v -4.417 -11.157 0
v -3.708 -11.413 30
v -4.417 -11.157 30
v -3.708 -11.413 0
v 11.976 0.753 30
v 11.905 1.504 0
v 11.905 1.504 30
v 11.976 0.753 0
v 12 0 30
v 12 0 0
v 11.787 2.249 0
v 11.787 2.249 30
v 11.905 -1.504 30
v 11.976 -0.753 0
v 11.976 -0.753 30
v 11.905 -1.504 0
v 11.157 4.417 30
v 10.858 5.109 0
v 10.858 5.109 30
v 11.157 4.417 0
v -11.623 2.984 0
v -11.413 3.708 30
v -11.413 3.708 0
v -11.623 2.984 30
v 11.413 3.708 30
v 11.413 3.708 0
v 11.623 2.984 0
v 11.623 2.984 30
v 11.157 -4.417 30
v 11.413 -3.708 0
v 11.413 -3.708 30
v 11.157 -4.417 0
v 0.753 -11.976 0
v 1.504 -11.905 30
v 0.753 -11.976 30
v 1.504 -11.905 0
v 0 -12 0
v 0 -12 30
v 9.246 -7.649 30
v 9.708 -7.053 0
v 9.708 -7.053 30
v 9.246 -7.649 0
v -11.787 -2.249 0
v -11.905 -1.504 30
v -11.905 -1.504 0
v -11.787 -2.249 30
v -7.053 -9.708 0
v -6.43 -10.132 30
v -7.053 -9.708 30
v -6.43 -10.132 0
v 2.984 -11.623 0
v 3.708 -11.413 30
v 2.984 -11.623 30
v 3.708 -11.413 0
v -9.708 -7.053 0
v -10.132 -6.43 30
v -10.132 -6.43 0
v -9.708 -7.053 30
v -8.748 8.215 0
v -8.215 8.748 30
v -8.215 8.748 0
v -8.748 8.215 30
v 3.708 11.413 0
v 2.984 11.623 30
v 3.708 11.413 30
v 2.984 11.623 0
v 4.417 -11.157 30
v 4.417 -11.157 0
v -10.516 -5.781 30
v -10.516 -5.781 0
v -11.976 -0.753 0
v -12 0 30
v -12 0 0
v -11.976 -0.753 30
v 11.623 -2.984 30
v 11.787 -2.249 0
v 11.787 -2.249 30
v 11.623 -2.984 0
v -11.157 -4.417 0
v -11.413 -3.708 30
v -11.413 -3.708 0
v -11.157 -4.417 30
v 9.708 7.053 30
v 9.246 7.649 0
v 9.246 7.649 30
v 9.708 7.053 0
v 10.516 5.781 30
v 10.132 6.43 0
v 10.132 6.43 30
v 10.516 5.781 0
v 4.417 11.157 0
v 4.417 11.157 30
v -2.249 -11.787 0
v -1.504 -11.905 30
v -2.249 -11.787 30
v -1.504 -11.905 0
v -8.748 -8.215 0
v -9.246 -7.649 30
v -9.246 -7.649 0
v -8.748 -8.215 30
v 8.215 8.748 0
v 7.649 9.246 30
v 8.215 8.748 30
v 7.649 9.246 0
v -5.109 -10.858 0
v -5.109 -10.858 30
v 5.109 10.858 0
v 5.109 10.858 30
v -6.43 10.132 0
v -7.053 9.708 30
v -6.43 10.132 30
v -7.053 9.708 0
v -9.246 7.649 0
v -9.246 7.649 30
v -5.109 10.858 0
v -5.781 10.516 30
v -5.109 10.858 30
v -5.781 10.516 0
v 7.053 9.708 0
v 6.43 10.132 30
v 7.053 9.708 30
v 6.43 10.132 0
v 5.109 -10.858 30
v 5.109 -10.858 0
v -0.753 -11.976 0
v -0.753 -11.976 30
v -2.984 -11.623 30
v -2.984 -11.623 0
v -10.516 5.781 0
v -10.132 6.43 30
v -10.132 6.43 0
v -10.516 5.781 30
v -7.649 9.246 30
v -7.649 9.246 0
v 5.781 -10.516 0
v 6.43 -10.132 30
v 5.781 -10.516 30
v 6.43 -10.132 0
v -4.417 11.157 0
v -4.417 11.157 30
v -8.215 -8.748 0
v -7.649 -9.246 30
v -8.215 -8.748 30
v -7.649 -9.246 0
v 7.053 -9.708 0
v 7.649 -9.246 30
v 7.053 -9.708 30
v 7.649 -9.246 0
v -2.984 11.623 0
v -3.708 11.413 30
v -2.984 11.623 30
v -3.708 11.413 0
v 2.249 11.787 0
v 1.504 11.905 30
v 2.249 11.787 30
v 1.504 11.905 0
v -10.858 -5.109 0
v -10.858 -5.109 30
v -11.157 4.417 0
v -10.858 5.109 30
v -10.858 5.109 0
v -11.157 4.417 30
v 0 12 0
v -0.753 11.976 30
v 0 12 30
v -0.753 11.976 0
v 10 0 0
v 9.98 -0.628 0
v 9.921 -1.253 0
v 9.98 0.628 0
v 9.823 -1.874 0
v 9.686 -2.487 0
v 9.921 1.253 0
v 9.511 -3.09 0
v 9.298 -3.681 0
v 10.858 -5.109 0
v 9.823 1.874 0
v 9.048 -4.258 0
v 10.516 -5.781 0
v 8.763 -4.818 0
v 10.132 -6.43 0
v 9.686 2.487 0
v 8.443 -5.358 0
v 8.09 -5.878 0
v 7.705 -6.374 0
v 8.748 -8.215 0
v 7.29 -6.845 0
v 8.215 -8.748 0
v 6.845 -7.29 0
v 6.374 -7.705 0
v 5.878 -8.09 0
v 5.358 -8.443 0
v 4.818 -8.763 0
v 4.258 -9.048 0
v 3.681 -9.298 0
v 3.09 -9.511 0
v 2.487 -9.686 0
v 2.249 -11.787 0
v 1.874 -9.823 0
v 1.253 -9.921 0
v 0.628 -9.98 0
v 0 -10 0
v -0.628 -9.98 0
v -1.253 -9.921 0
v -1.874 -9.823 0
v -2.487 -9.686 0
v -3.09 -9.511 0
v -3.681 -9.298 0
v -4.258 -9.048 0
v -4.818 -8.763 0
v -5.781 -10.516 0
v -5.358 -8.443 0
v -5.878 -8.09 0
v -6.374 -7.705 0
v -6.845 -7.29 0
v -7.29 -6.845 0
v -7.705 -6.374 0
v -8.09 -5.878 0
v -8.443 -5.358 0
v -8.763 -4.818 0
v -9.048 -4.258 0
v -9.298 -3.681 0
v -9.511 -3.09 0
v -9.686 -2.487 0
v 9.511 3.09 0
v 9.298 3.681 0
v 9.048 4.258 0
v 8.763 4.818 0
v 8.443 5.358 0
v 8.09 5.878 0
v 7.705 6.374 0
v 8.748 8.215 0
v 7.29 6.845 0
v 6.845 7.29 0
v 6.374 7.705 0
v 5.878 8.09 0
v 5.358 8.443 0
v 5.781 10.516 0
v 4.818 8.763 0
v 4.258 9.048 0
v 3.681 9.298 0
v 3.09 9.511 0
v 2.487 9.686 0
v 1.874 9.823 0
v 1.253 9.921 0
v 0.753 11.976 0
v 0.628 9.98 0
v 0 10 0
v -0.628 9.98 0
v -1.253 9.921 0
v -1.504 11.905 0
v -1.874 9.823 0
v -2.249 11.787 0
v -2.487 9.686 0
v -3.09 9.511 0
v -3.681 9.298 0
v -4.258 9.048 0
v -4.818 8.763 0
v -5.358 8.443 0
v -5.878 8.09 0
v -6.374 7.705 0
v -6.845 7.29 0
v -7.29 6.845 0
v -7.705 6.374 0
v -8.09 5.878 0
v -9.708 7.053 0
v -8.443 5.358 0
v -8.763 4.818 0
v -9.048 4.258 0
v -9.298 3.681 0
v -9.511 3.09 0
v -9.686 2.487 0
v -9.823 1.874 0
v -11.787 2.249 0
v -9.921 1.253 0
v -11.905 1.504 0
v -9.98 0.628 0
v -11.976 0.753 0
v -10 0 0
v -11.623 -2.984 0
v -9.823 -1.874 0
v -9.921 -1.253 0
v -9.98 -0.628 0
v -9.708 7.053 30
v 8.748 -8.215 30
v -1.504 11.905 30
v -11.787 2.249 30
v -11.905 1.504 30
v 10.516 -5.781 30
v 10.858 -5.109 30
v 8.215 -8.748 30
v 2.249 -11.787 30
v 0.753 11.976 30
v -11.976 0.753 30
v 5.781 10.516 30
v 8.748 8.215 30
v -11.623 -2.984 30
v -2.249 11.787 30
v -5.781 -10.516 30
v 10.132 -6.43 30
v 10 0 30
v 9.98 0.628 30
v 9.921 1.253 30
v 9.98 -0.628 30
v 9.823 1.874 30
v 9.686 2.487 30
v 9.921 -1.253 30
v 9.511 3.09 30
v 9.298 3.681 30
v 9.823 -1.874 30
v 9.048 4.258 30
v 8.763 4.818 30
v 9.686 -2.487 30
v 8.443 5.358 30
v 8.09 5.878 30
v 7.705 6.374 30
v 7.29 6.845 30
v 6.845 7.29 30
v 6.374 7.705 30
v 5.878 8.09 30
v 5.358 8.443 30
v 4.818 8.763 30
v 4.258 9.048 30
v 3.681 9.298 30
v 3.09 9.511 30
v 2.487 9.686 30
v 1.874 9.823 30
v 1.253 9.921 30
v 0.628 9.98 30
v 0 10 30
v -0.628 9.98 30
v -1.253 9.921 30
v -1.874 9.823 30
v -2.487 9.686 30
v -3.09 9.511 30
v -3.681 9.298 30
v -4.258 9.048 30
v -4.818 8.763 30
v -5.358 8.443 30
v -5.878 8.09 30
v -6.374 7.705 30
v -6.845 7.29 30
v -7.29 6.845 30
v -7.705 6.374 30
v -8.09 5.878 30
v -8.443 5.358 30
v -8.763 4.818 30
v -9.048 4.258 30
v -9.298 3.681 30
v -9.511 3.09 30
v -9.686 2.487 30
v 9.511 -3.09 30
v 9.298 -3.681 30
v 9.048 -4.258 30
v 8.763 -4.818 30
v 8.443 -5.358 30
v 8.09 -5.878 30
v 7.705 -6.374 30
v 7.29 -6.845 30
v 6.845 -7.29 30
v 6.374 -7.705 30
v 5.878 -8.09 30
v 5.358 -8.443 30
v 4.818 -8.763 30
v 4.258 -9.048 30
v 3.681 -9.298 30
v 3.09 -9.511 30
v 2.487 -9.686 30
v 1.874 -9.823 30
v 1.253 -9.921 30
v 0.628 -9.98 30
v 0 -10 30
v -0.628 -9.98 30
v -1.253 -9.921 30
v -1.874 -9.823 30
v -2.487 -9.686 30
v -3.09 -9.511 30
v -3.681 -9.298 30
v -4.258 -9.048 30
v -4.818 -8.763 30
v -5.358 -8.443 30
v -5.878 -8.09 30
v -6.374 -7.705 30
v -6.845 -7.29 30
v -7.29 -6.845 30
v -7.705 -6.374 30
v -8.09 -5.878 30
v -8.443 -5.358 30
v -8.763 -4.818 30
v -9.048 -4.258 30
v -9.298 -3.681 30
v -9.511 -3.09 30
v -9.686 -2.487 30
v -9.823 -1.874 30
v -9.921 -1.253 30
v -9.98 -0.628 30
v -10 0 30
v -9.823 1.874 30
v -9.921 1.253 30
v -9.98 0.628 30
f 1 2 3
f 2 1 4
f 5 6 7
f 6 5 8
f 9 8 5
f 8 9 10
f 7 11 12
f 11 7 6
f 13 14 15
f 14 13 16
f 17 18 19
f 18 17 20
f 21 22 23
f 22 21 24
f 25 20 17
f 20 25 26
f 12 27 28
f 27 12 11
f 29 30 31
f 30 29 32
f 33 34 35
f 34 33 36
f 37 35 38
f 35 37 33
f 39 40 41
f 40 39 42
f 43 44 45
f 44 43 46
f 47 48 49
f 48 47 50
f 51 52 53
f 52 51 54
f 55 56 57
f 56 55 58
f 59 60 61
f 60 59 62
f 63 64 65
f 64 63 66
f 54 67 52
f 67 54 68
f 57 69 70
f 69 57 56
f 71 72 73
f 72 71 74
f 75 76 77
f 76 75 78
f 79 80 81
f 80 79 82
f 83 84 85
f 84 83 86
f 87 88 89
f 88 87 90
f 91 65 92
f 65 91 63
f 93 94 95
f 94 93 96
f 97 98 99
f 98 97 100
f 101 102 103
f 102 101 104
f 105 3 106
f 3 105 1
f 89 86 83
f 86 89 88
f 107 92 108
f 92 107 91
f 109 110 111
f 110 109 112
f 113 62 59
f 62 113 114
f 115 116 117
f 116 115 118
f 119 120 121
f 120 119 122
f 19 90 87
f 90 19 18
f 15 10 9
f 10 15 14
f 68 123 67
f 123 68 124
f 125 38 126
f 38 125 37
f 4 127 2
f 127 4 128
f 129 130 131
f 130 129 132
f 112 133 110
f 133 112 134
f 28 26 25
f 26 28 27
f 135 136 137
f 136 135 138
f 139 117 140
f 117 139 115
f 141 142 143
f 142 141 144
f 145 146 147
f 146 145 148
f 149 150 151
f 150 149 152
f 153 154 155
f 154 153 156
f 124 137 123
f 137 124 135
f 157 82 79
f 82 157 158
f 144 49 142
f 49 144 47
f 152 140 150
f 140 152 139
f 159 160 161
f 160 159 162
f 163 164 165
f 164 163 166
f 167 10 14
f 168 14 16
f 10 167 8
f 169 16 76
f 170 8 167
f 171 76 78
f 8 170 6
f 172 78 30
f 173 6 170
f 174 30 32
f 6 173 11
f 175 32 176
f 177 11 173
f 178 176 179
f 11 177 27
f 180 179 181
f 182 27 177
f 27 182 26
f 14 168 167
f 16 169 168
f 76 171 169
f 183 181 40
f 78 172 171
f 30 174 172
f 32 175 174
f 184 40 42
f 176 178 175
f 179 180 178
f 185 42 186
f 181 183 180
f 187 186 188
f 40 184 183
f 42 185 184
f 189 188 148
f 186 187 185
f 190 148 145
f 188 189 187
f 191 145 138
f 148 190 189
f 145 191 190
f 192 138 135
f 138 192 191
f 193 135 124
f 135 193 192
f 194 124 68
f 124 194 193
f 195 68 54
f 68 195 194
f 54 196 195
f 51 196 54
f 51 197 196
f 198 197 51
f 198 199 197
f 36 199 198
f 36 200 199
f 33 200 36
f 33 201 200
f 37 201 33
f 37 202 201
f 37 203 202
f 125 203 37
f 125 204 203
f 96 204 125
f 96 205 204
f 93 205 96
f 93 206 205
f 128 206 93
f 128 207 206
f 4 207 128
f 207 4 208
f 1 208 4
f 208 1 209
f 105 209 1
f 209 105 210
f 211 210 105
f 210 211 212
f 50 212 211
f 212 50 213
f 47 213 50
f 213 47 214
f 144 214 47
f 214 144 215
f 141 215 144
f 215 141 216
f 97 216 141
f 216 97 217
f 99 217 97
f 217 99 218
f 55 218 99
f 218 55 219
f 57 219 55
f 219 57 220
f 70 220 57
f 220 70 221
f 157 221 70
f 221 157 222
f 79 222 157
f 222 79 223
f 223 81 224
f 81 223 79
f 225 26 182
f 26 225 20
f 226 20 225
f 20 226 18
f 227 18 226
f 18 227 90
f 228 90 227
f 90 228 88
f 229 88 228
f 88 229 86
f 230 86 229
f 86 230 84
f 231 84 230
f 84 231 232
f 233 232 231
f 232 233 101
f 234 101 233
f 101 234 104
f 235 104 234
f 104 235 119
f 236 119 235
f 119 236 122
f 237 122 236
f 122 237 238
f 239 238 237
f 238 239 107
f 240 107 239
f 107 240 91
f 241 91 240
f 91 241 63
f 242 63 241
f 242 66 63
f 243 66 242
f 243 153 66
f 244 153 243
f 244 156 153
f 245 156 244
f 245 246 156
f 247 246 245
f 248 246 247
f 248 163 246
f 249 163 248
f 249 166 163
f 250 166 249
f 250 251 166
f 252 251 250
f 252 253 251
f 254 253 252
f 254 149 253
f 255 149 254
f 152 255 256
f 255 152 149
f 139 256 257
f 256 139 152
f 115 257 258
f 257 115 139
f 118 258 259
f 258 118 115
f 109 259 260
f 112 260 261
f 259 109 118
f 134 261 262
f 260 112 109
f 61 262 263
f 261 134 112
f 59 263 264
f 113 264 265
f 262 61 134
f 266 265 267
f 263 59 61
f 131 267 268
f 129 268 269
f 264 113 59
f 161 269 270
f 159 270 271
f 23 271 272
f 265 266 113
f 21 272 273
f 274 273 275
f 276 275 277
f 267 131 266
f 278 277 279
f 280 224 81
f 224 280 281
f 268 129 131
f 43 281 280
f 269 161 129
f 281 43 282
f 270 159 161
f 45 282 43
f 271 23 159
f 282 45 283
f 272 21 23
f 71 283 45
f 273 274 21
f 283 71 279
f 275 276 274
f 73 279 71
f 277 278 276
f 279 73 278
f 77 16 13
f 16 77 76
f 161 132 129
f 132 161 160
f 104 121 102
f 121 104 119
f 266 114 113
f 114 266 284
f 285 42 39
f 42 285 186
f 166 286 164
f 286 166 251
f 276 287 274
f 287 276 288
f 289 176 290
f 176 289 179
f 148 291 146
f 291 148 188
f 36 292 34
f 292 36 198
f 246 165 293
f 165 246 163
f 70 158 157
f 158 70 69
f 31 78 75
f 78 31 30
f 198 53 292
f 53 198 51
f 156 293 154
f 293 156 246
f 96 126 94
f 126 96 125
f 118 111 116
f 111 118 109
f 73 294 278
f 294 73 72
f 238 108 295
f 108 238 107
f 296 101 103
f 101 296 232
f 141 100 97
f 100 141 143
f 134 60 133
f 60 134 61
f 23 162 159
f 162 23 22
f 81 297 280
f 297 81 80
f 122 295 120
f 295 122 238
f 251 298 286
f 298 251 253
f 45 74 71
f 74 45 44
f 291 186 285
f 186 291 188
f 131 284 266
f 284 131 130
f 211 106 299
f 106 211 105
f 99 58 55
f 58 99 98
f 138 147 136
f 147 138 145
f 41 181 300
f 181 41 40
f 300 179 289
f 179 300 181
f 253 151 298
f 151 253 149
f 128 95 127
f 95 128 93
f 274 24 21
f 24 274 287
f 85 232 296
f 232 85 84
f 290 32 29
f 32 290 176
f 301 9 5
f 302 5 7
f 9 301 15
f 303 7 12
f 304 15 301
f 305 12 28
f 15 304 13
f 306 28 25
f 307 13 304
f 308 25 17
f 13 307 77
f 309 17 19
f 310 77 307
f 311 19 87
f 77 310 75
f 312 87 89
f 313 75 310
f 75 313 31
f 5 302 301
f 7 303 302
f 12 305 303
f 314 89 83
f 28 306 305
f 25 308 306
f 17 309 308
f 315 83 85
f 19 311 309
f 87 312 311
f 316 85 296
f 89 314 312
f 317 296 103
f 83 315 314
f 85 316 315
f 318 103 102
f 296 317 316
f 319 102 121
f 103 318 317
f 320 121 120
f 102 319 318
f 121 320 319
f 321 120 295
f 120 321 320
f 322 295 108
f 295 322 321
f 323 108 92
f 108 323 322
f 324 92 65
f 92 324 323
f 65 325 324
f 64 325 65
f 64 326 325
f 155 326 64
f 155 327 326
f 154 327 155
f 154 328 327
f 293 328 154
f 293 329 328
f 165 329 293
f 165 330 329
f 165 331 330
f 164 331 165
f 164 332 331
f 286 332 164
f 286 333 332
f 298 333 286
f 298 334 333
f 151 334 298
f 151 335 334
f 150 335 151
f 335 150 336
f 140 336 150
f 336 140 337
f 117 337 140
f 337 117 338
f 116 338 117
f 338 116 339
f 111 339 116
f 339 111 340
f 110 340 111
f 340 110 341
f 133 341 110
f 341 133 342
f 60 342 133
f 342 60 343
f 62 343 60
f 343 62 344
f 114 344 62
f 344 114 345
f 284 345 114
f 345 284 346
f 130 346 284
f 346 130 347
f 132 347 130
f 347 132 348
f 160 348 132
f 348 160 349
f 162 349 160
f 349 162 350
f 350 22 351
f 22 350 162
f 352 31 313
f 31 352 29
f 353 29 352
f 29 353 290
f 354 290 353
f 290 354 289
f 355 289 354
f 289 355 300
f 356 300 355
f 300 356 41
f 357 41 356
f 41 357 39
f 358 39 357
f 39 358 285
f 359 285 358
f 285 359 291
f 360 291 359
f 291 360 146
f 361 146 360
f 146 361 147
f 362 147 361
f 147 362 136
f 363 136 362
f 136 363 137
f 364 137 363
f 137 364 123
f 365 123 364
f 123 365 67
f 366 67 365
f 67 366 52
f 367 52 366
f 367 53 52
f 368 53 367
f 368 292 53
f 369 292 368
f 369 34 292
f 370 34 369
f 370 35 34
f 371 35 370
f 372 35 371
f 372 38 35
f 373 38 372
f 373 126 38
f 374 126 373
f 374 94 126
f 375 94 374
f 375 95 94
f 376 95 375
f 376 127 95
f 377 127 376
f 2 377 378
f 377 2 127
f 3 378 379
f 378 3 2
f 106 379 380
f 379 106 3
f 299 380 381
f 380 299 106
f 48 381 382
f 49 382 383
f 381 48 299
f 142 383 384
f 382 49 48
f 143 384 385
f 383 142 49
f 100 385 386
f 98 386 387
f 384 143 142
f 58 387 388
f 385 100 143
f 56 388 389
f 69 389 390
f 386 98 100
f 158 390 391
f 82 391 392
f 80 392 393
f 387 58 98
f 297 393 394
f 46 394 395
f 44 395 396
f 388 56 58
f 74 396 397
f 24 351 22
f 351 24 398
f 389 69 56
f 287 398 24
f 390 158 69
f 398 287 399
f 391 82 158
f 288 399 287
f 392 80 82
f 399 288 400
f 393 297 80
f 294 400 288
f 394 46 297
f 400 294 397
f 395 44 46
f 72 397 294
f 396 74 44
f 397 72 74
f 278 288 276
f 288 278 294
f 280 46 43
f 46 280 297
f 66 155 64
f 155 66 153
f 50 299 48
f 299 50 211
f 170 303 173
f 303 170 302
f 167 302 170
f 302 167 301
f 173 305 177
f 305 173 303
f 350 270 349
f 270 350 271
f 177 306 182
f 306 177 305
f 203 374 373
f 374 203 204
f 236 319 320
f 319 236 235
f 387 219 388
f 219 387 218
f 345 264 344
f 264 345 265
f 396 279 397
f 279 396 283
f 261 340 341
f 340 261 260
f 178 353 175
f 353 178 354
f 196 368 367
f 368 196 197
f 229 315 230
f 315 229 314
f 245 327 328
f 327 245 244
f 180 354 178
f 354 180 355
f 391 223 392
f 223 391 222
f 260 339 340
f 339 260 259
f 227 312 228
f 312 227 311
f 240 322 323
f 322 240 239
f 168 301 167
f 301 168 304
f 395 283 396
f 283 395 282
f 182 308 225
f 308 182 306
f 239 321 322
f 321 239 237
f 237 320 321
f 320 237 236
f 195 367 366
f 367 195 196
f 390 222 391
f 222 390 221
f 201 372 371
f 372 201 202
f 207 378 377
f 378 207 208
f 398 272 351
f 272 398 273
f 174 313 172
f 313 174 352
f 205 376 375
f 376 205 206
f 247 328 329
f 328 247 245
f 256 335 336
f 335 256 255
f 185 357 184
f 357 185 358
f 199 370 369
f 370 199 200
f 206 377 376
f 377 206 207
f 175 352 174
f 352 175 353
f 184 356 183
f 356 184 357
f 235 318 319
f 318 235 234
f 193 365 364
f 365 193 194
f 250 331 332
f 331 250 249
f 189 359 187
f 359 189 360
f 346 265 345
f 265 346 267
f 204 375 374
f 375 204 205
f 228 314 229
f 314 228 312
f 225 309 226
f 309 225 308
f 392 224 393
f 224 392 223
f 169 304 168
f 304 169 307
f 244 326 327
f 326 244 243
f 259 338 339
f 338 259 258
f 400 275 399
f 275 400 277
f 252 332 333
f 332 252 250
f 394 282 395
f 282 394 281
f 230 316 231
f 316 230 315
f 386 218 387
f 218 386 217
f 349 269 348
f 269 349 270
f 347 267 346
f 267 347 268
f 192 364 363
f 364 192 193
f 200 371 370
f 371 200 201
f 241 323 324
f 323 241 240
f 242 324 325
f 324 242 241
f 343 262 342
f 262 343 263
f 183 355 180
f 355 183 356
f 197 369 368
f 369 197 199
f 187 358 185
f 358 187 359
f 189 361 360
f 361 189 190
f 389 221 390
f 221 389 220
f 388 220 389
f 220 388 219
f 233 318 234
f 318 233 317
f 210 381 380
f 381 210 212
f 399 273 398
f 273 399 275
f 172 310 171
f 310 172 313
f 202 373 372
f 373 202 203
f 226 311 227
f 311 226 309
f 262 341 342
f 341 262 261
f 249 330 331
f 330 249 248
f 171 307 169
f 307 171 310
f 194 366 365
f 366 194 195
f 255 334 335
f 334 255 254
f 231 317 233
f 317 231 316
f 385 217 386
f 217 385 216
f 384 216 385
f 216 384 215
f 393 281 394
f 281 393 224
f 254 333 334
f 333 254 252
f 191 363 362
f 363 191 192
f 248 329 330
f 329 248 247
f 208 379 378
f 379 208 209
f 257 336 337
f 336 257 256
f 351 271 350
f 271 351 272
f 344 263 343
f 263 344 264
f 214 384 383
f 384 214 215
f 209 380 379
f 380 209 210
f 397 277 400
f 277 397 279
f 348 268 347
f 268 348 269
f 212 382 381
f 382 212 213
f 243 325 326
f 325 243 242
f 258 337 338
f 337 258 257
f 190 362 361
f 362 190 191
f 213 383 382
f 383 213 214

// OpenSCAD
module tube(innerRadius, height, wallWidth) {
	outerRadius = innerRadius + wallWidth;

	difference() {
		cylinder(r = outerRadius, h = height);
		translate([0, 0, -5]) {
			cylinder(r = innerRadius, h = height + 10);
		}
	}	
}

tube(10, 30, 2, $fn = 100);
